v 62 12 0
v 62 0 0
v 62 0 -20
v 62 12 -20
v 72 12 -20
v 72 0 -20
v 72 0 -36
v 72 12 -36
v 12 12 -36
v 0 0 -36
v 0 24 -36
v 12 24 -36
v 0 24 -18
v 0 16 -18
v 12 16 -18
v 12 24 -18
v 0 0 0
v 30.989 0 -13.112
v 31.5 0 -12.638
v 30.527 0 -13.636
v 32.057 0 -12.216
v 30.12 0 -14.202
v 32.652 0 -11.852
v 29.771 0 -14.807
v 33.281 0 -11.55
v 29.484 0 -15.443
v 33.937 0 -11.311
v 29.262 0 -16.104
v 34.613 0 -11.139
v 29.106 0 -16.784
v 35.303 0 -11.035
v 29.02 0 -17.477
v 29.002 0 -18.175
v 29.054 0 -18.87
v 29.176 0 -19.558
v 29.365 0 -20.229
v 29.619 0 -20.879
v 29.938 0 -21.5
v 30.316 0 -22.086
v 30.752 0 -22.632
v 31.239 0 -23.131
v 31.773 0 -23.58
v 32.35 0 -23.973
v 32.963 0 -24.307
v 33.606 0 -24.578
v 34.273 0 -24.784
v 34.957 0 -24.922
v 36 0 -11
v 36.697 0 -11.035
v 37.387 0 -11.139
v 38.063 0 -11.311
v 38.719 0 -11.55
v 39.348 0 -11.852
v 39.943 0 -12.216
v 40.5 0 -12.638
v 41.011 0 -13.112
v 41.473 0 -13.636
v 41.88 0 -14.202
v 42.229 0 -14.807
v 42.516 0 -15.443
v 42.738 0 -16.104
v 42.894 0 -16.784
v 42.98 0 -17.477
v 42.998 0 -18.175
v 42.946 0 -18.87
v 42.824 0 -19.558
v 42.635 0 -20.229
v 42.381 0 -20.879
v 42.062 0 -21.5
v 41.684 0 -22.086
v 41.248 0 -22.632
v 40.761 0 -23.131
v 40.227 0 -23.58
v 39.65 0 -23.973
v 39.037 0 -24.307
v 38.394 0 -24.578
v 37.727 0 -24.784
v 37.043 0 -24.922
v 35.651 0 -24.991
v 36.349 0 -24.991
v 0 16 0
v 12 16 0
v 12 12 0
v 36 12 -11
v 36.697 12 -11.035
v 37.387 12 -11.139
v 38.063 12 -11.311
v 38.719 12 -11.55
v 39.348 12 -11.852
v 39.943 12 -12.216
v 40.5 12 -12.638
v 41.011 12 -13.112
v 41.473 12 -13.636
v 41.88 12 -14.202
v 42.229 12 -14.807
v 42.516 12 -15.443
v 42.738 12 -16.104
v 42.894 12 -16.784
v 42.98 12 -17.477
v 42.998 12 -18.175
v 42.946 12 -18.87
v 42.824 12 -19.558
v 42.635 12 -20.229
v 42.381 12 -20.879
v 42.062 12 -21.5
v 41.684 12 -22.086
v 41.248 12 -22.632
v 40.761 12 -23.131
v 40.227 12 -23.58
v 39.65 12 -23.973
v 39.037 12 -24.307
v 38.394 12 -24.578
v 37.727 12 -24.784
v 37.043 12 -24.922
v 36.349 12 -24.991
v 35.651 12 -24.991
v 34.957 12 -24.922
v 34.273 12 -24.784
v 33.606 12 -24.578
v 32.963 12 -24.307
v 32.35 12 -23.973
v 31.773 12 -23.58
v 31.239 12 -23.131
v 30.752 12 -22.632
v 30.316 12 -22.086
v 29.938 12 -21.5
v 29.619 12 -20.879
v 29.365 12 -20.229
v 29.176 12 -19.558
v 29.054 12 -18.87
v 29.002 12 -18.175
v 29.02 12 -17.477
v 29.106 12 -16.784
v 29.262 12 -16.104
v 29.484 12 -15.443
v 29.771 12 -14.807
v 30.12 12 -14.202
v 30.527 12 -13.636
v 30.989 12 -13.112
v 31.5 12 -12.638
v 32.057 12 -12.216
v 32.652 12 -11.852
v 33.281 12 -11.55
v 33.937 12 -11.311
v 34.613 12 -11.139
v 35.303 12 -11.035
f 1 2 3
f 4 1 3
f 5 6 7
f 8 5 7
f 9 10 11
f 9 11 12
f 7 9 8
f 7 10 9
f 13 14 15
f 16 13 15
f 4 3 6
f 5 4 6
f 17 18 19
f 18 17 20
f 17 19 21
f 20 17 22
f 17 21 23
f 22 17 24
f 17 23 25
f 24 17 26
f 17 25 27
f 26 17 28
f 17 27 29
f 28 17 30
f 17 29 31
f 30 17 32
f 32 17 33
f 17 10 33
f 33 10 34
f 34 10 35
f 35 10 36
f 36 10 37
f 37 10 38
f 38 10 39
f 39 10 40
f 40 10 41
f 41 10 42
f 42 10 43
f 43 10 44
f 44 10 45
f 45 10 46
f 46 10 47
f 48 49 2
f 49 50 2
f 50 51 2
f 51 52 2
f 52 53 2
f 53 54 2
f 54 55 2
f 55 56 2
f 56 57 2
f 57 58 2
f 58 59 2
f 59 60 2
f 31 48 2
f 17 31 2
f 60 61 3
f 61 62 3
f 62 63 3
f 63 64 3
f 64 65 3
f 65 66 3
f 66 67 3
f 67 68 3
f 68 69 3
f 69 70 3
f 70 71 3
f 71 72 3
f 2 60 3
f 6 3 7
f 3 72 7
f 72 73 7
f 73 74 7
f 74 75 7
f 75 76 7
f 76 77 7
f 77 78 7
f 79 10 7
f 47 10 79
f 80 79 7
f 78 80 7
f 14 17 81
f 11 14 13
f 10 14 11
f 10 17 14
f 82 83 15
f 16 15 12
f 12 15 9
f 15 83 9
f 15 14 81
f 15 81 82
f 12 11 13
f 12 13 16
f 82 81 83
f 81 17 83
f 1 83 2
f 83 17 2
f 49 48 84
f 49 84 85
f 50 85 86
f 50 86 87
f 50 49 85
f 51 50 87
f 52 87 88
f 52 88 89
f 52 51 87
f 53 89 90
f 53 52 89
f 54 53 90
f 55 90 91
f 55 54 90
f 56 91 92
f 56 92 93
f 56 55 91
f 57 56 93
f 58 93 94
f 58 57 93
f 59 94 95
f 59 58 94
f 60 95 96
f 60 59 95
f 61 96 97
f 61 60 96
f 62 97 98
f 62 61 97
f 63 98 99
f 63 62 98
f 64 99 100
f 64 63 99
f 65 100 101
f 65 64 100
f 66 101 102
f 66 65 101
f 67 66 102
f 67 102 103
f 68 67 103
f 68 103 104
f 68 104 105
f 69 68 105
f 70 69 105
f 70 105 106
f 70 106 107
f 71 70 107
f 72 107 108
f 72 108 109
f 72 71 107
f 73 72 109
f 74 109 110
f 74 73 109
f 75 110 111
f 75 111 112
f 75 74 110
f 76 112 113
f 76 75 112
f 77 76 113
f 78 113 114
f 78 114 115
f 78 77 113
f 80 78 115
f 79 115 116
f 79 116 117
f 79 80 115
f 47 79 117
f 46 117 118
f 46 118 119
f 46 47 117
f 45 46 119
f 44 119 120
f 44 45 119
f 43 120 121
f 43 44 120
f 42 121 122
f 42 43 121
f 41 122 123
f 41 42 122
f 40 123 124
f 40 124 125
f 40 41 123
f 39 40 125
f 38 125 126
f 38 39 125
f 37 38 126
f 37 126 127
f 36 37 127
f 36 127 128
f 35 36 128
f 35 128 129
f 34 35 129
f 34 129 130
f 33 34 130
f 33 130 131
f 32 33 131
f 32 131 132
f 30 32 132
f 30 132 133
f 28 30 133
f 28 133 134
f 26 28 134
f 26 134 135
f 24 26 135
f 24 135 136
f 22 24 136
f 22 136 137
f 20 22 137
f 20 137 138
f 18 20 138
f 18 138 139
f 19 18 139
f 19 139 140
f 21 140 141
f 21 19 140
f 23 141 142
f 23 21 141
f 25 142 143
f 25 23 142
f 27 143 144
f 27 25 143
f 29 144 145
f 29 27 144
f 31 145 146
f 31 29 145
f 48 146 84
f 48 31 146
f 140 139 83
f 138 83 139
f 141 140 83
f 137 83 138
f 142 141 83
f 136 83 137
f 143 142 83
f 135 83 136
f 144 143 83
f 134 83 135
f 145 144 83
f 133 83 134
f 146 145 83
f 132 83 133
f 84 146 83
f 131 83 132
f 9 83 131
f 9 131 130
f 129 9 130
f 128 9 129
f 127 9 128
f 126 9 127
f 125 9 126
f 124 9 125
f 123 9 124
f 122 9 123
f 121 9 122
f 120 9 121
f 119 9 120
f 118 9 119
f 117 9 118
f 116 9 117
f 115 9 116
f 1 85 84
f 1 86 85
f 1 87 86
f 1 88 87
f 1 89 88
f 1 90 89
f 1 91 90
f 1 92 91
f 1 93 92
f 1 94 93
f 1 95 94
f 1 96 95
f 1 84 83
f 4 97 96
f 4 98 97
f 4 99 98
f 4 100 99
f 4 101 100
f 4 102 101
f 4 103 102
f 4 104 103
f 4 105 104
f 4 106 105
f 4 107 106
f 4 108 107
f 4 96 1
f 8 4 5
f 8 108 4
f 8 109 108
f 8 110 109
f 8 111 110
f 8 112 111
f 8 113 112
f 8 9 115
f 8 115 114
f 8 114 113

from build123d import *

# Parameters (mm, degrees)
SKETCH_1_R      = 7
EXTRUDE_1_DEPTH = 12
SKETCH_2_W      = 12
SKETCH_2_H      = 18
EXTRUDE_2_DEPTH = 4
SKETCH_3_W      = 12
SKETCH_3_H      = 18
EXTRUDE_3_DEPTH = 12


with BuildPart() as part:
    # 草圖1 → 填料-伸長1 (new body)
    with BuildSketch(Plane(origin=(0, 0, 0), x_dir=(1, 0, 0), z_dir=(0, 1, 0))):
        Polygon((0, 0), (62, 0), (62, 20), (72, 20), (72, 36), (0, 36), align=None)
        with Locations(Location((36, 18, 0), (0, 0, 270))):
            Circle(SKETCH_1_R, mode=Mode.SUBTRACT)
    extrude(amount=EXTRUDE_1_DEPTH)

    # 草圖2 → 填料-伸長2 (add)
    with BuildSketch(Plane(origin=(0, 12, 0), x_dir=(1, 0, 0), z_dir=(0, 1, 0))):
        with Locations((6, 9)):
            Rectangle(SKETCH_2_W, SKETCH_2_H)
    extrude(amount=EXTRUDE_2_DEPTH)

    # 草圖3 → 填料-伸長3 (add)
    with BuildSketch(Plane(origin=(0, 12, 0), x_dir=(1, 0, 0), z_dir=(0, 1, 0))):
        with Locations((6, 27)):
            Rectangle(SKETCH_3_W, SKETCH_3_H)
    extrude(amount=EXTRUDE_3_DEPTH)


solid = part.part
